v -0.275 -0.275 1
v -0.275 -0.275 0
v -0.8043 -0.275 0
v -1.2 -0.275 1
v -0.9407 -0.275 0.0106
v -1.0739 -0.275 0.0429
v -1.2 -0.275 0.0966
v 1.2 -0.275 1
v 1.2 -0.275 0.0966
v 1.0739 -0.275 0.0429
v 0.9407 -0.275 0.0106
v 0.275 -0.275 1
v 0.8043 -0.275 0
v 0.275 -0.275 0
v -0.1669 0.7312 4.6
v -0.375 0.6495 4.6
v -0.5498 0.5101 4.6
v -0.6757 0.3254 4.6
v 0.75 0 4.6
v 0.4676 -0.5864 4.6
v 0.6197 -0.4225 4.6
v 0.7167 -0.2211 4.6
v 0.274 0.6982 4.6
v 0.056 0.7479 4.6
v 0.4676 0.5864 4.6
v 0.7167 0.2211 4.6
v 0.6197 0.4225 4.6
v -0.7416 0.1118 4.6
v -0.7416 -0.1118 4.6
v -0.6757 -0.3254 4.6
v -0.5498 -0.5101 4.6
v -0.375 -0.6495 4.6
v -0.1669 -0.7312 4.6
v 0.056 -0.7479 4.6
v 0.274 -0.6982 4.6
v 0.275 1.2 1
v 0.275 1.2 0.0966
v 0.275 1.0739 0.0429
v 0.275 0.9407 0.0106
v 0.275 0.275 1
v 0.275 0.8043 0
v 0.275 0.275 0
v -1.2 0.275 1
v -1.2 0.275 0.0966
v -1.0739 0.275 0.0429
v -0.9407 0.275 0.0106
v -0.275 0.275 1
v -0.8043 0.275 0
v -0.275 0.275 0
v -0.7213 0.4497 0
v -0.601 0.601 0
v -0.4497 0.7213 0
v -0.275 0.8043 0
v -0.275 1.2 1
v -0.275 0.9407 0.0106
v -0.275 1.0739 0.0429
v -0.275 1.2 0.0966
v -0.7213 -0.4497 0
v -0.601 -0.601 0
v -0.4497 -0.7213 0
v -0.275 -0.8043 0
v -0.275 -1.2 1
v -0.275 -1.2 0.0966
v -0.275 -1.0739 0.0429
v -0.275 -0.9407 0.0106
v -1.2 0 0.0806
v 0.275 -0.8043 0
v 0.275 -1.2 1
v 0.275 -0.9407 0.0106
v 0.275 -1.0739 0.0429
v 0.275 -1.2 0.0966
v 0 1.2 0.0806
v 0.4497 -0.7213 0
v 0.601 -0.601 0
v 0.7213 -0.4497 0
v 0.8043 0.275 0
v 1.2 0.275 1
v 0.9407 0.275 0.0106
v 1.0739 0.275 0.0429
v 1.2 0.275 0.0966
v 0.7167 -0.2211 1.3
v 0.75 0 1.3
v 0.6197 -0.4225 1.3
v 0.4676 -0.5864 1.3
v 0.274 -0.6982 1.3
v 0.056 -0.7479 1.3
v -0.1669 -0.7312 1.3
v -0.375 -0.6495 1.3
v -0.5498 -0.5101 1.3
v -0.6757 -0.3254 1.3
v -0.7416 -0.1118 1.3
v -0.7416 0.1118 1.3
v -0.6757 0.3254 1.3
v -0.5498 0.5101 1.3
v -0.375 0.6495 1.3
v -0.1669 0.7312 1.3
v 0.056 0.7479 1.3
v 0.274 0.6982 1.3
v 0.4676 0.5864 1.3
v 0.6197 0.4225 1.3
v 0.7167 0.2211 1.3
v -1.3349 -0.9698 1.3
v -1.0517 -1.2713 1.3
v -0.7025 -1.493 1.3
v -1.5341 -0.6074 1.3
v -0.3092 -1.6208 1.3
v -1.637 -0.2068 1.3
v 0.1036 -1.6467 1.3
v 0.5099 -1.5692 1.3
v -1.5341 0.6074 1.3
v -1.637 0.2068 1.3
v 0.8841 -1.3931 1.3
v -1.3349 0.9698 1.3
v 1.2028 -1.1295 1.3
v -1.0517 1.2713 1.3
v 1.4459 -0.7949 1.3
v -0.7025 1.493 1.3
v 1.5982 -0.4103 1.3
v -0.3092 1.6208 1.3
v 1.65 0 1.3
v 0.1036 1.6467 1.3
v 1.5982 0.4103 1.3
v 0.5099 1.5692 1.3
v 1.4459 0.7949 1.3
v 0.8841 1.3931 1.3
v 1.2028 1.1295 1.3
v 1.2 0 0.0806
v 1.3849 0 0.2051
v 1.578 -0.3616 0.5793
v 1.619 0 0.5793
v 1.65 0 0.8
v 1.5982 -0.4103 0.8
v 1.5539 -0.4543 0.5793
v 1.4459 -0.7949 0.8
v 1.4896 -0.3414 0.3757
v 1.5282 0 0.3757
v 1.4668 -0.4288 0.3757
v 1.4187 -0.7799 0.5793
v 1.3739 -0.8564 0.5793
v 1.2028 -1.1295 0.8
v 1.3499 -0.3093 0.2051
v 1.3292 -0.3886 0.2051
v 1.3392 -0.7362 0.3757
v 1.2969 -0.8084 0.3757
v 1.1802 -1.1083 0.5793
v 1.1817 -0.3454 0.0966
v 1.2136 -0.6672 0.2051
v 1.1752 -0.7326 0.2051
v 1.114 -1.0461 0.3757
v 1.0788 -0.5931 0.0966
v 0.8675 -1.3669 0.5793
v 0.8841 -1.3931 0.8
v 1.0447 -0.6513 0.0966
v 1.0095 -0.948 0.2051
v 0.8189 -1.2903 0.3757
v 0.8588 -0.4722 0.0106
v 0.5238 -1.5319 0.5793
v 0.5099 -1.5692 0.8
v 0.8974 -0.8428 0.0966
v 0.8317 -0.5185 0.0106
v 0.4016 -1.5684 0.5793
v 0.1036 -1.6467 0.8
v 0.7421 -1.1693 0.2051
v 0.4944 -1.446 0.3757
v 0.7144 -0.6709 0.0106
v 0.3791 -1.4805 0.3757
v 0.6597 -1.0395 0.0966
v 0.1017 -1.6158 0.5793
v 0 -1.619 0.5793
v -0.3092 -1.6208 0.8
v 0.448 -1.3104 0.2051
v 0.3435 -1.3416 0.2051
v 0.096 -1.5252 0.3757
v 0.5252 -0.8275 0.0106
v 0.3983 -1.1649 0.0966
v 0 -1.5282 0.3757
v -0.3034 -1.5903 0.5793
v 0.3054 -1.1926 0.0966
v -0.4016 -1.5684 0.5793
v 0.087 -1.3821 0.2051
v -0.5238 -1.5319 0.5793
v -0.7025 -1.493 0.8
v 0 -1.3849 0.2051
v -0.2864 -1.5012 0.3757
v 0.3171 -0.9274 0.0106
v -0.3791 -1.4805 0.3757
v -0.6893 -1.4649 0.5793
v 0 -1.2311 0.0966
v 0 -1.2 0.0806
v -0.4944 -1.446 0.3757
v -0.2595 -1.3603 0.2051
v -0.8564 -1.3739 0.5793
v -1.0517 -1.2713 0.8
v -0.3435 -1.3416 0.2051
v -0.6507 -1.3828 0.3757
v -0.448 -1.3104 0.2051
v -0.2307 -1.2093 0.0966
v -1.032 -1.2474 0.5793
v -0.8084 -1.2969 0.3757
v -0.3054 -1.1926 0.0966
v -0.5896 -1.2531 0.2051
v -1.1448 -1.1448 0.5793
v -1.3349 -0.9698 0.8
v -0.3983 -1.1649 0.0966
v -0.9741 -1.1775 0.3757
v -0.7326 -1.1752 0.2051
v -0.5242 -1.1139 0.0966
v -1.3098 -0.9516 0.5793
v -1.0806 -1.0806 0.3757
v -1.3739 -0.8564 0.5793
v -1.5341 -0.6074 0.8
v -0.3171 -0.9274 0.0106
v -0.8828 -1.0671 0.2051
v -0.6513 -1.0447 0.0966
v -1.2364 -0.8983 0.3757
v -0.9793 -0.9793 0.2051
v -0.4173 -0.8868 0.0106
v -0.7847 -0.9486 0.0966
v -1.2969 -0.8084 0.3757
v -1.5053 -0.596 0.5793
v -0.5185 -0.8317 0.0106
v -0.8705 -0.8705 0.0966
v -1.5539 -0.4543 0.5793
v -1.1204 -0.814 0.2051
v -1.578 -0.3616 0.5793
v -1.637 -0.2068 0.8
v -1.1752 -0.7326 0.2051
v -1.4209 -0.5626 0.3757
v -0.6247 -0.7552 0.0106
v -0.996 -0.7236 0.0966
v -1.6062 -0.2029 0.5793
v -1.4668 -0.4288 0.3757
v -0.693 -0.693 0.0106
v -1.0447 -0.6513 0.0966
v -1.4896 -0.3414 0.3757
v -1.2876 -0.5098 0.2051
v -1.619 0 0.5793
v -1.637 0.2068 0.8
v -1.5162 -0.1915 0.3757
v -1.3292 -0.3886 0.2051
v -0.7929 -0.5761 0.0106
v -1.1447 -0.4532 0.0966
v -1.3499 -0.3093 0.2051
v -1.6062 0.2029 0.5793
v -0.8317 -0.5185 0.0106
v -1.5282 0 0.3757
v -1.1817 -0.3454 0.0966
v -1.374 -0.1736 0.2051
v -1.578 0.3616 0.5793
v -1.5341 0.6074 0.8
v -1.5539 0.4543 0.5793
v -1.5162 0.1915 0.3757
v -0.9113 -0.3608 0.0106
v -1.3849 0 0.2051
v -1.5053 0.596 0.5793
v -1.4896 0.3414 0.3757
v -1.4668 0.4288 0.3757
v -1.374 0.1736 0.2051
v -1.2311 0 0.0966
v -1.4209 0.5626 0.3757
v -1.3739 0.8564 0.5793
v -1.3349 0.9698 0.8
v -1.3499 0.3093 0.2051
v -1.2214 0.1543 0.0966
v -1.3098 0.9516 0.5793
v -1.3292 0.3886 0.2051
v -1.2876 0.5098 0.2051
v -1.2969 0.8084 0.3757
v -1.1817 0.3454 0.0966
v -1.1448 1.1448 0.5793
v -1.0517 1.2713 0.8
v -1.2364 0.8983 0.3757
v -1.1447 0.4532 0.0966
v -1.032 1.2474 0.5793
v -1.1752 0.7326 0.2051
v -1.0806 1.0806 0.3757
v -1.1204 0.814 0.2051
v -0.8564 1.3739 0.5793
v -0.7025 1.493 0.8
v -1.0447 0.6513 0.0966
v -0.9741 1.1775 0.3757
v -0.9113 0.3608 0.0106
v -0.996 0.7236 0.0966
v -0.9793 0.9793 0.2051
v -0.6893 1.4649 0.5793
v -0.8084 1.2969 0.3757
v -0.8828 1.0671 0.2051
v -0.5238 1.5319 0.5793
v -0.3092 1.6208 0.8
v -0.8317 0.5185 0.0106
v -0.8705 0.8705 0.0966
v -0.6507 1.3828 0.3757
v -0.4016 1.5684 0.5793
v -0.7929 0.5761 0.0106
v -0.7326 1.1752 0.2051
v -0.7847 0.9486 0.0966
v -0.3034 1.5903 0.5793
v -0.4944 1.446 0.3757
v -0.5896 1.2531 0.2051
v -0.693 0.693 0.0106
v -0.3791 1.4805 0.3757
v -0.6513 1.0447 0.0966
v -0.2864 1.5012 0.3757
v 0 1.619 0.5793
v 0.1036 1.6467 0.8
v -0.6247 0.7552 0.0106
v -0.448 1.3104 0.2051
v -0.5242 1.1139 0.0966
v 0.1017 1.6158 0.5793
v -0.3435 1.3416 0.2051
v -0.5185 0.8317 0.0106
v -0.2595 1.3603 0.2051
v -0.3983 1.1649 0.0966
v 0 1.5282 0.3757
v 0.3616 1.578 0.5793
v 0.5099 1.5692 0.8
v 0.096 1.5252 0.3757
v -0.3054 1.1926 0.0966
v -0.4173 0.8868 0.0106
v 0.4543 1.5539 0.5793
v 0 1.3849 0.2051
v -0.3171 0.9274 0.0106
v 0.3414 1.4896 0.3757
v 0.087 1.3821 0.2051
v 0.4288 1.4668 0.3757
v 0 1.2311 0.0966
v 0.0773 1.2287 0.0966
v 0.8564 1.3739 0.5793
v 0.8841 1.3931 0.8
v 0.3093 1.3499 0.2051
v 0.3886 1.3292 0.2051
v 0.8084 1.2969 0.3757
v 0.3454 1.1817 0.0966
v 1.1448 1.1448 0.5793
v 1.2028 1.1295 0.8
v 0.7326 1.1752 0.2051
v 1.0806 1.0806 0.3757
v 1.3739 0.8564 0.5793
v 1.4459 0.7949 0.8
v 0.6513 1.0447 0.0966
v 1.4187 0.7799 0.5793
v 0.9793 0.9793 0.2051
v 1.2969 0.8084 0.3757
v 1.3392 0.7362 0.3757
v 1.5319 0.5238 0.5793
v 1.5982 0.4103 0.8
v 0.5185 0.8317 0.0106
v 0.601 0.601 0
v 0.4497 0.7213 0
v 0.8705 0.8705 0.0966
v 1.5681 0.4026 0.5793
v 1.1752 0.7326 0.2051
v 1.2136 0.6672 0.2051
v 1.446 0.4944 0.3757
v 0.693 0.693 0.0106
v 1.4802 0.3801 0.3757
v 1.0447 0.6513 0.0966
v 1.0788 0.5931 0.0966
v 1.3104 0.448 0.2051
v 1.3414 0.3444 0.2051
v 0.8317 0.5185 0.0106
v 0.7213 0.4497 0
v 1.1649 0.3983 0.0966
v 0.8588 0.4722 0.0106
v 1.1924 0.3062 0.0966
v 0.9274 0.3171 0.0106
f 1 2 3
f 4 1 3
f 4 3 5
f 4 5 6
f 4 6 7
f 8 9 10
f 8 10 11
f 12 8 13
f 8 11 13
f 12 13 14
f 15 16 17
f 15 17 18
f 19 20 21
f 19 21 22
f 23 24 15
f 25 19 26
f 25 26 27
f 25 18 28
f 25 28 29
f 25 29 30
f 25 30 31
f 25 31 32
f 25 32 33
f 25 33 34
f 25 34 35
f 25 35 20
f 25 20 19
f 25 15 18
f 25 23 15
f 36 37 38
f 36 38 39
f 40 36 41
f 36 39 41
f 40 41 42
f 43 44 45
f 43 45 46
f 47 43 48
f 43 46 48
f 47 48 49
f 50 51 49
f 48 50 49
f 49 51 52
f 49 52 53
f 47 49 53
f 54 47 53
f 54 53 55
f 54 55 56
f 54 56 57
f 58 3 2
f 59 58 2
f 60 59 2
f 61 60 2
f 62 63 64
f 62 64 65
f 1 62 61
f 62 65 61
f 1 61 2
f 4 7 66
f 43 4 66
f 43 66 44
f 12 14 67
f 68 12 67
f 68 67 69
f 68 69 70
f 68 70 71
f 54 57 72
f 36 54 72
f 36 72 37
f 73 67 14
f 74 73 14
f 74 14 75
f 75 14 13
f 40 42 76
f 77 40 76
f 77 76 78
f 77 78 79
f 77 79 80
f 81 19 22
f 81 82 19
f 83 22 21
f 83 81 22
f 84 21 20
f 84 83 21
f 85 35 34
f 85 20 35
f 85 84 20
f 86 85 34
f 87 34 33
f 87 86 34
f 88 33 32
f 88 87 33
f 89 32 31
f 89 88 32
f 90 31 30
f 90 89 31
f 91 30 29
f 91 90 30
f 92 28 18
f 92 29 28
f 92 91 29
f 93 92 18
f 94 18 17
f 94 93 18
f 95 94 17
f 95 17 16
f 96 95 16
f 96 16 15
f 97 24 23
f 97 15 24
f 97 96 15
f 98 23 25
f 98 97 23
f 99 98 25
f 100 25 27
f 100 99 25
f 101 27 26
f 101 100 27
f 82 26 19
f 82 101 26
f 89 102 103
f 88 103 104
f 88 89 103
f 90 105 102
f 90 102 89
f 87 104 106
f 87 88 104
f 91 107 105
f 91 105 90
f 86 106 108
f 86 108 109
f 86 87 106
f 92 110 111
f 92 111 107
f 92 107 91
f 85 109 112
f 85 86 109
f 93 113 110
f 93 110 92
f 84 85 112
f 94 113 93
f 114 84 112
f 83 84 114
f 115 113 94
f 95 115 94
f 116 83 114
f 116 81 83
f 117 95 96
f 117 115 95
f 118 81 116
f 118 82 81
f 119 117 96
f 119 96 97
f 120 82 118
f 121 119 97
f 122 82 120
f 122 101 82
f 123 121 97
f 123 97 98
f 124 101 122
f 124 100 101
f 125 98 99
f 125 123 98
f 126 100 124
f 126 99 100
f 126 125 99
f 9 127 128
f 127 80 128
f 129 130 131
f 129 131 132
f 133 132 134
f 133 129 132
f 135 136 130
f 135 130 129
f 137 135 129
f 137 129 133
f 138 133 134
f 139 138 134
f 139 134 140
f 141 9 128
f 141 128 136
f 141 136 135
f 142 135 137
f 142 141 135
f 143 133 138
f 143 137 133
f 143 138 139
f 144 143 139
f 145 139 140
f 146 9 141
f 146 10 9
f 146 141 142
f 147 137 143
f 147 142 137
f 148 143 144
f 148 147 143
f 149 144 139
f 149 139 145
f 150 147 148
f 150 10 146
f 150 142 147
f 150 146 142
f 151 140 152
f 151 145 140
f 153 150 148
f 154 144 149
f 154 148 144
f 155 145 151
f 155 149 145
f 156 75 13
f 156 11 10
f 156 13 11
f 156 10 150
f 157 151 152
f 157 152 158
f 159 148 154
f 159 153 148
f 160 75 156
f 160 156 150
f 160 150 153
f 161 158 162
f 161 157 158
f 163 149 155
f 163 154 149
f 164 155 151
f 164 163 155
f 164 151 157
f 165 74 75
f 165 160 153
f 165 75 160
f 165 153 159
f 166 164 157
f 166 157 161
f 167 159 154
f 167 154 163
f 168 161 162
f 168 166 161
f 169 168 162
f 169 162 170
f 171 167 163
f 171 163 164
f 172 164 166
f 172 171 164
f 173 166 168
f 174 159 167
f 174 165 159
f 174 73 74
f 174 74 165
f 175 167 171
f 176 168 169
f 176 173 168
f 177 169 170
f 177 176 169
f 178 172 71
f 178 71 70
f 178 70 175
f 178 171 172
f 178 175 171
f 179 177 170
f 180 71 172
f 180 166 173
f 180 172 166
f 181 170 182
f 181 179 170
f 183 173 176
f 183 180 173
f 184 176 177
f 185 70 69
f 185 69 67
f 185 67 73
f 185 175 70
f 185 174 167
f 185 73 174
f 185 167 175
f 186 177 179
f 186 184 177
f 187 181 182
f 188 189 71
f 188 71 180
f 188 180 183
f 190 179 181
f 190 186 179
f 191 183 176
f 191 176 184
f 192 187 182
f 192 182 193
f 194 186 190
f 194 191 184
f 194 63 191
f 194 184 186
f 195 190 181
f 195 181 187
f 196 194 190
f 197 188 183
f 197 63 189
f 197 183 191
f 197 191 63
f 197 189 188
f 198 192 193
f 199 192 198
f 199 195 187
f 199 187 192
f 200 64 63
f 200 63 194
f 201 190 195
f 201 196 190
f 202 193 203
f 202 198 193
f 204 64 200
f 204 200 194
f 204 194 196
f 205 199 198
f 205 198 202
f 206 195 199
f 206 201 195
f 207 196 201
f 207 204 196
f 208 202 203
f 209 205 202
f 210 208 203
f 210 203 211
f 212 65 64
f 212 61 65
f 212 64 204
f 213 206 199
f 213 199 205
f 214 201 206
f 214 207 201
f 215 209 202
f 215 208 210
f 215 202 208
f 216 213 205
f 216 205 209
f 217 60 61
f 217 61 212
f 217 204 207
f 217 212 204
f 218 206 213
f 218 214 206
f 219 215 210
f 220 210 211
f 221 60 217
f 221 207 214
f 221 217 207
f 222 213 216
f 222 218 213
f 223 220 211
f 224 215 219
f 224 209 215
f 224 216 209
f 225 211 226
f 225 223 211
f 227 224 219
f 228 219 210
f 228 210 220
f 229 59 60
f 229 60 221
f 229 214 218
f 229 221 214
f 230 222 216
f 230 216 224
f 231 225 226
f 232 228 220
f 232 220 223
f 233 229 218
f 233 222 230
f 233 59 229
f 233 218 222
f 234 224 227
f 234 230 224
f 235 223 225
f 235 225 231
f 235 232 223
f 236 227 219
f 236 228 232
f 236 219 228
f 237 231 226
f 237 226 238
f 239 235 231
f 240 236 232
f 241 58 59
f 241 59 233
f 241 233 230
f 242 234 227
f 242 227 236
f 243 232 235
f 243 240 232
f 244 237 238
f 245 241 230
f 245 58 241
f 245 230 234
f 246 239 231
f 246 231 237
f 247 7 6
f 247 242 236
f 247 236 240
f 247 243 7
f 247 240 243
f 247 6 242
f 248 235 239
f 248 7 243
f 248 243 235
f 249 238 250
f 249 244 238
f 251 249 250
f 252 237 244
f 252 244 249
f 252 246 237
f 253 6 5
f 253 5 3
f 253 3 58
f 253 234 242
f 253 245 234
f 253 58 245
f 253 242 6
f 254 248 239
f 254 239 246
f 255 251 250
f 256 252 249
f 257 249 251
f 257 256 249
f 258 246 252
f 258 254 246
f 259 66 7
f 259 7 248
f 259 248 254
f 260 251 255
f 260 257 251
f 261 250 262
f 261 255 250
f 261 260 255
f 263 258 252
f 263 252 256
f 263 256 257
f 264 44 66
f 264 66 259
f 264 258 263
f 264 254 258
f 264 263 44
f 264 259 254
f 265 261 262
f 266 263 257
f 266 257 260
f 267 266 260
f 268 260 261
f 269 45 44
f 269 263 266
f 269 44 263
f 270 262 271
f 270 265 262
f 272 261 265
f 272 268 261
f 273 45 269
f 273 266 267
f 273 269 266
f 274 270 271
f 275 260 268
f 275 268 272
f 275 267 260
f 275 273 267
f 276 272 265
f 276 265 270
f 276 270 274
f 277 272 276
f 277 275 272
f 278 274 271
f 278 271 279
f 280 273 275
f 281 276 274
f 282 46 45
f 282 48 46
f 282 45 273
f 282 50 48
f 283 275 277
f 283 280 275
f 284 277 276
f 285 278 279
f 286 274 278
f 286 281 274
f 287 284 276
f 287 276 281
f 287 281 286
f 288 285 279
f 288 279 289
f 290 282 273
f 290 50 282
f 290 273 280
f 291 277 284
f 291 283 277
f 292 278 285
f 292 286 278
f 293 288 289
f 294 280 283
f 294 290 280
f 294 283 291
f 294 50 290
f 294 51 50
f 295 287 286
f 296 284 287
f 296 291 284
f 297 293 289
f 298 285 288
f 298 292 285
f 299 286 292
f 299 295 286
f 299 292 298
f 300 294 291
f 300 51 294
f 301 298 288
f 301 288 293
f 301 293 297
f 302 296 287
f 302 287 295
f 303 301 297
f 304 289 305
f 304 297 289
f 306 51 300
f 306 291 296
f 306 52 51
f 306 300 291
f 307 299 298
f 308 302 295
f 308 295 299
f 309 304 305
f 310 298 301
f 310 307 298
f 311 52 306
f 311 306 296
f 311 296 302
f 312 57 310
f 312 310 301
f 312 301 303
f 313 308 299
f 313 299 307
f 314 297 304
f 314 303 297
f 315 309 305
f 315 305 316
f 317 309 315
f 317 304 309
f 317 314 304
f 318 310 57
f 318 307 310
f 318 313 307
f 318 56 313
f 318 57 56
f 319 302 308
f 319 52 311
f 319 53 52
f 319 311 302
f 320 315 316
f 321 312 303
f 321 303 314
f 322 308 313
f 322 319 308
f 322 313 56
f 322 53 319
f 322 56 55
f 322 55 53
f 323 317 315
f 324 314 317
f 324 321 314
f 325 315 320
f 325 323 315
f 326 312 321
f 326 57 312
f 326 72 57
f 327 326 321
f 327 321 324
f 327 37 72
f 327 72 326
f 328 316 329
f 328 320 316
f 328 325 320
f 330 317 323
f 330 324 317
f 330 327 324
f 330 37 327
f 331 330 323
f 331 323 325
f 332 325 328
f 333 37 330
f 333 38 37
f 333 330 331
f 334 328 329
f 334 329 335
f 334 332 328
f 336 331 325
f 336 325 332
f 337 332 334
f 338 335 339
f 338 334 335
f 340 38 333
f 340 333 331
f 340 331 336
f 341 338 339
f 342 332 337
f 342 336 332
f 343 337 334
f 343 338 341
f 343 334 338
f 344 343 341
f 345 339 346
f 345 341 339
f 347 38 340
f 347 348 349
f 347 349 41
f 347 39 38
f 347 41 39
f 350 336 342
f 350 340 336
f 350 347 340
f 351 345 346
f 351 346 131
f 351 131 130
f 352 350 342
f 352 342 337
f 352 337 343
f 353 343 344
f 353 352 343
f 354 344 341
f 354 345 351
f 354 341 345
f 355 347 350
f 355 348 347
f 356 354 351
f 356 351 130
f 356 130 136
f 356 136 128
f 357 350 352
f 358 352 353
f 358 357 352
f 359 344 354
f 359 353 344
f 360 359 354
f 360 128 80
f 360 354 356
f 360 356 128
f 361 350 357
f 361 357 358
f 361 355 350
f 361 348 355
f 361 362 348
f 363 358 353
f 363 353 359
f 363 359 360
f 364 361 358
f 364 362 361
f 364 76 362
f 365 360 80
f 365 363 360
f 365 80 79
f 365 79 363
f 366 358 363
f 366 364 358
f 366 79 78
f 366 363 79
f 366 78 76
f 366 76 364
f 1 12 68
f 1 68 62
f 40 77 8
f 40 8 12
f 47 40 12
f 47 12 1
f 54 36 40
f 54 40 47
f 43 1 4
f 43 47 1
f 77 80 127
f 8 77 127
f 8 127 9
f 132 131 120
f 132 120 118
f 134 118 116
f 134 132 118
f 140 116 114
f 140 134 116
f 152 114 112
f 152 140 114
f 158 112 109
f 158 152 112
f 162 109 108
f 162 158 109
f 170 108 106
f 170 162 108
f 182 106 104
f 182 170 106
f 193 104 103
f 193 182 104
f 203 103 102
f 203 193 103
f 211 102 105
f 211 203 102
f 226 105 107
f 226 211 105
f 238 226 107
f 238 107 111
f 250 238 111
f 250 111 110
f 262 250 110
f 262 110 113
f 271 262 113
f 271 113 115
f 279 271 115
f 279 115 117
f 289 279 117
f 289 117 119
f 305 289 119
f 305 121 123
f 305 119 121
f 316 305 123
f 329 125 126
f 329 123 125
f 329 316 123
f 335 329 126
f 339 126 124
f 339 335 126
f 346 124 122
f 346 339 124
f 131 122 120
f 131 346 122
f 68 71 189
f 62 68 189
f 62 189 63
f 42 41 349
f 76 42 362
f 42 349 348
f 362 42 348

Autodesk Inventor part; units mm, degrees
ref_plane "YZ Plane" through (0, 0, 0) normal (1, 0, 0) x (0, 1, 0)
ref_plane "XZ Plane" through (0, 0, 0) normal (0, 1, 0) x (-1, 0, 0)
ref_plane "XY Plane" through (0, 0, 0) normal (0, 0, 1) x (1, 0, 0)
sketch "Skizze1" plane through (0, 0, 0) normal (0, 0, 1) x (1, 0, 0)
  circle A0 centre (0, 0) radius 1.65
  dimension "d0" = 3.3
extrude "Extrusion1" add sketch "Skizze1" along normal blind 1.3
sketch "Skizze2" plane through (0, 0, 1.3) normal (0, 0, 1) x (1, 0, 0)
  circle A0 centre (0, 0) radius 0.75
  dimension "d3" = 1.5
extrude "Extrusion2" add sketch "Skizze2" along normal blind 3.3
sketch "Skizze3" plane through (0, 0, 0) normal (0, 0, -1) x (-1, 0, 0)
  line L0 (-0.275, -1.2) -> (0.275, -1.2)
  line L1 (0.275, -1.2) -> (0.275, 1.2)
  line L2 (0.275, 1.2) -> (-0.275, 1.2)
  line L3 (-0.275, 1.2) -> (-0.275, -1.2)
  line L4 (-0.275, -1.2) -> (0.275, 1.2) construction
  line L5 (0.275, -1.2) -> (-0.275, 1.2) construction
  line L6 (-1.2, -0.275) -> (1.2, -0.275)
  line L7 (1.2, -0.275) -> (1.2, 0.275)
  line L8 (1.2, 0.275) -> (-1.2, 0.275)
  line L9 (-1.2, 0.275) -> (-1.2, -0.275)
  line L10 (-1.2, -0.275) -> (1.2, 0.275) construction
  line L11 (1.2, -0.275) -> (-1.2, 0.275) construction
  point P0 (0, 0)
  dimension "d6" = 0.55
  dimension "d7" = 0.55
  dimension "d8" = 2.4
  dimension "d9" = 2.4
extrude "Extrusion3" cut sketch "Skizze3" against normal blind 1
fillet "Rundung1" radius 0.8 1 edges at (-1.65, 0, 0)
equation "\"d7\" = d6"
properties part number "screw" material "Stahl"
